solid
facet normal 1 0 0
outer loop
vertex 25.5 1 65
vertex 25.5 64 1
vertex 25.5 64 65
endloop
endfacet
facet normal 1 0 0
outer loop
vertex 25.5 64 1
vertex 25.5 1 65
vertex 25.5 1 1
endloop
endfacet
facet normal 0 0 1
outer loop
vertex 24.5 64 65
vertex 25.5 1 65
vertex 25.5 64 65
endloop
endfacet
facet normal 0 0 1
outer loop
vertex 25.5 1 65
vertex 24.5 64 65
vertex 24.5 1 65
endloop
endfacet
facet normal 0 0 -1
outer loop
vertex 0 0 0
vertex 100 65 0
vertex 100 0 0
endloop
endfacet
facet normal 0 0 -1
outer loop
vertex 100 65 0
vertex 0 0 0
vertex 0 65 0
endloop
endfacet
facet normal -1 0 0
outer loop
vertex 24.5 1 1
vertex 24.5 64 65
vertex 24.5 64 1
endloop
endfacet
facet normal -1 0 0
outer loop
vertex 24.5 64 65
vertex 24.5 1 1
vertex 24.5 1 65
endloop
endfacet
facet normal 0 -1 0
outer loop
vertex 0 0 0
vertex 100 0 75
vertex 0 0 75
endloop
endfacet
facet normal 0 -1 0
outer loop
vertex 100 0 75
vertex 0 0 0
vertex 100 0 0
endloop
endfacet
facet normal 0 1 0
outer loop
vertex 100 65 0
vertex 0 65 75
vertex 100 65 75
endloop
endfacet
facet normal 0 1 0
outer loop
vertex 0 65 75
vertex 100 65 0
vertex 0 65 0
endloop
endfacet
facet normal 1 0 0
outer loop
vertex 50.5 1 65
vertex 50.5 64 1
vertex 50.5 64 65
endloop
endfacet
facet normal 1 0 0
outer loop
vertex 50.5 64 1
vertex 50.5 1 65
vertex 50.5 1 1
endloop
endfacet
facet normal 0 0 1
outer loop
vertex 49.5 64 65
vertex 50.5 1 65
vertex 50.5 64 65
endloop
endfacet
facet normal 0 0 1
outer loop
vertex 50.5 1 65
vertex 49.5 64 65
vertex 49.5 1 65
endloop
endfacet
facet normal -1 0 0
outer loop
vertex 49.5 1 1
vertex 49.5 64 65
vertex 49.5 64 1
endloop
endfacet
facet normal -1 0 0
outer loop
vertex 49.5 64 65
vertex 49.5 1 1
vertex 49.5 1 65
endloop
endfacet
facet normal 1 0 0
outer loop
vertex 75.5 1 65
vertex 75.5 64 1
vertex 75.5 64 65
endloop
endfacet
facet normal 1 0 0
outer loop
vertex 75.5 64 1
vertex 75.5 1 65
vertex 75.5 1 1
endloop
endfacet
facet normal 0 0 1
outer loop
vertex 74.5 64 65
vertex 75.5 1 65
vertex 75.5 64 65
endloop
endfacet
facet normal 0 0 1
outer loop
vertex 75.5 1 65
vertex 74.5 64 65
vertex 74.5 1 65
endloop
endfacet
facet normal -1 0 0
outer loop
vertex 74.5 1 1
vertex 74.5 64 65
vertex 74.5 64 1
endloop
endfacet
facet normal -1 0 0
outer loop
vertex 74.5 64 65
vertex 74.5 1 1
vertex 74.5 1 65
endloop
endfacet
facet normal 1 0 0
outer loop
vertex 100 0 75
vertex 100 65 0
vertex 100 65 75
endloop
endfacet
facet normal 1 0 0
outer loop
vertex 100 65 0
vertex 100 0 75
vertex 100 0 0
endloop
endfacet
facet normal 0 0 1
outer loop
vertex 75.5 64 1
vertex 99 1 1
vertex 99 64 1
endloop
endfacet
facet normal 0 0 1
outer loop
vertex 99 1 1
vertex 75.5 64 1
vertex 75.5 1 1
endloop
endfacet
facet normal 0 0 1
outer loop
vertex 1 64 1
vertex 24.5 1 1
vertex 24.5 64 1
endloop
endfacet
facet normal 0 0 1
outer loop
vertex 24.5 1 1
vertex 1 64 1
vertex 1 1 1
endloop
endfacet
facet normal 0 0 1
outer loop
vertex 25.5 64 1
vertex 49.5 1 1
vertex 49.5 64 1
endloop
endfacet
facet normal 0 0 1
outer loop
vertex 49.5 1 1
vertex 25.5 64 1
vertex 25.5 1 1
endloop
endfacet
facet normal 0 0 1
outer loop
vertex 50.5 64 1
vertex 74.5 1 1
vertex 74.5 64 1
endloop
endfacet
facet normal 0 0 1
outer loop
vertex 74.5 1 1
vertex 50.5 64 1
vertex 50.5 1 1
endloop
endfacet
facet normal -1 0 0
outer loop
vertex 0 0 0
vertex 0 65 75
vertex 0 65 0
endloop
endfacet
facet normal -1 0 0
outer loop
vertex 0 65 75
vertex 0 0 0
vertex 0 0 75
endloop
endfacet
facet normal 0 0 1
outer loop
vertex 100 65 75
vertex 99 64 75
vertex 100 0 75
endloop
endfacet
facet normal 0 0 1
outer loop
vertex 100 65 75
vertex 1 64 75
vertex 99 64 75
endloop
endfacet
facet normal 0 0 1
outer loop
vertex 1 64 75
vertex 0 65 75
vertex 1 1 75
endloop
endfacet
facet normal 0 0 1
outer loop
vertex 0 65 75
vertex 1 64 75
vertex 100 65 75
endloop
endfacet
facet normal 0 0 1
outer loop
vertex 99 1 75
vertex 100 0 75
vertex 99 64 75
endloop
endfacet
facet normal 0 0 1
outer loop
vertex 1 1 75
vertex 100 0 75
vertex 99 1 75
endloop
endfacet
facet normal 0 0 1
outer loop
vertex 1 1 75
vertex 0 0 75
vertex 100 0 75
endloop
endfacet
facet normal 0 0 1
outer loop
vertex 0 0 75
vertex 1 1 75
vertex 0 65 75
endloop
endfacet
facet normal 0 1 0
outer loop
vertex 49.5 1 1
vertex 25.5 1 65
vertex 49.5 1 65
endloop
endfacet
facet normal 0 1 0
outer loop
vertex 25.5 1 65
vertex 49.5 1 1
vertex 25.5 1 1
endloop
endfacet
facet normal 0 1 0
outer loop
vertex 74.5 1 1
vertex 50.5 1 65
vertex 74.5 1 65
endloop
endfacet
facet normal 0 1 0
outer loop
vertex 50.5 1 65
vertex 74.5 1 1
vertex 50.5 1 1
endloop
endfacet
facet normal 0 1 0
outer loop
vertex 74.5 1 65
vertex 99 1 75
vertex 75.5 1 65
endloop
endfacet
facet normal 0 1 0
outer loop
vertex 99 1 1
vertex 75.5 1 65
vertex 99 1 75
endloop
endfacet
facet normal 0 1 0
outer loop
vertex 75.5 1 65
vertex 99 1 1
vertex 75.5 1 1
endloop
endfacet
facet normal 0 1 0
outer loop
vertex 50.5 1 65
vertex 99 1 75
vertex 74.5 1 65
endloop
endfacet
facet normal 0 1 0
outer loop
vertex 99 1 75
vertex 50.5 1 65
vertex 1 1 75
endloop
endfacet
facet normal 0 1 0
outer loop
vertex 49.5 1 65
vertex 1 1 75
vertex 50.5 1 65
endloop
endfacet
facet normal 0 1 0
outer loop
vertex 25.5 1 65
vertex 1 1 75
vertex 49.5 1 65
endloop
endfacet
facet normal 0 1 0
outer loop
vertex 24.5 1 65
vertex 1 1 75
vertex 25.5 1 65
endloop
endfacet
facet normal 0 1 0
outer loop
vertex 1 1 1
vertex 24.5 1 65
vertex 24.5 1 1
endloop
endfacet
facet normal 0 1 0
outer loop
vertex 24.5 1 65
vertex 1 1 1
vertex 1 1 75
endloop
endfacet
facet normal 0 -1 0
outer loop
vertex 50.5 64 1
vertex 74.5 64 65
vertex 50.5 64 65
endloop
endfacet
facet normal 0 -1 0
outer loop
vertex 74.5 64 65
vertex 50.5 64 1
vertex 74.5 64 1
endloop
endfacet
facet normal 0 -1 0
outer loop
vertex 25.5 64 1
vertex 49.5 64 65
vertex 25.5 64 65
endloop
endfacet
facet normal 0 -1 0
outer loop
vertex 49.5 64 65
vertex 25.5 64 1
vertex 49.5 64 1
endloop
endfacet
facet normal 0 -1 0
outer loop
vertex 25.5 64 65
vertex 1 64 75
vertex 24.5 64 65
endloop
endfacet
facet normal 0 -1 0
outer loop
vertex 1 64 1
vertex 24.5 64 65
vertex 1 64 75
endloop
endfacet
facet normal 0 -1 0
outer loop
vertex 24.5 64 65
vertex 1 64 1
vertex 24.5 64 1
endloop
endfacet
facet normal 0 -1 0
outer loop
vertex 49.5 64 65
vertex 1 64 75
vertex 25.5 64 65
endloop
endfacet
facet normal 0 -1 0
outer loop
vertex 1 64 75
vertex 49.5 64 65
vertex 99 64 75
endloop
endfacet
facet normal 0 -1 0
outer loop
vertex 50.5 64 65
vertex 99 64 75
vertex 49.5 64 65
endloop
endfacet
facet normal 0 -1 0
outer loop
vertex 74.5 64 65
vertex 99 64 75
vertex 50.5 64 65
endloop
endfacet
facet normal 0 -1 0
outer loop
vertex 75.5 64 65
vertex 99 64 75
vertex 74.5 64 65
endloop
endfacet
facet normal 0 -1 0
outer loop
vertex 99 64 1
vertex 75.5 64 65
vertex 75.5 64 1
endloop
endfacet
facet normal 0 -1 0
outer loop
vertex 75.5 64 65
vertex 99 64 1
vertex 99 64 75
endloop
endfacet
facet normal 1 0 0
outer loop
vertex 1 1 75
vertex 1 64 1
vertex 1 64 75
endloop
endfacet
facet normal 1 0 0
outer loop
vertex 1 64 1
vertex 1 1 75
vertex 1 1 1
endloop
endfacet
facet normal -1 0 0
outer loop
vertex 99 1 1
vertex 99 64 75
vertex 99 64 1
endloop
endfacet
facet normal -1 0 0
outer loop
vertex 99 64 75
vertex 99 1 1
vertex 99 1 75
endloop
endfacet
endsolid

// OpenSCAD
T=1;
H=75;
cube([100,65,T]);
cube([100,T,H]);
translate([0,65-T,0]) cube([100,T,H]);
cube([T,65,H]);
translate([100-T,0,0]) cube([T,65,H]);

R=3;
for (i = [1 : R]) {
translate([i * 100/(R+1)-T/2,0,0]) cube([T,55,H-10]);
translate([i* 100/(R+1)-T/2,55,0]) cube([T,10,H-10]);
}
